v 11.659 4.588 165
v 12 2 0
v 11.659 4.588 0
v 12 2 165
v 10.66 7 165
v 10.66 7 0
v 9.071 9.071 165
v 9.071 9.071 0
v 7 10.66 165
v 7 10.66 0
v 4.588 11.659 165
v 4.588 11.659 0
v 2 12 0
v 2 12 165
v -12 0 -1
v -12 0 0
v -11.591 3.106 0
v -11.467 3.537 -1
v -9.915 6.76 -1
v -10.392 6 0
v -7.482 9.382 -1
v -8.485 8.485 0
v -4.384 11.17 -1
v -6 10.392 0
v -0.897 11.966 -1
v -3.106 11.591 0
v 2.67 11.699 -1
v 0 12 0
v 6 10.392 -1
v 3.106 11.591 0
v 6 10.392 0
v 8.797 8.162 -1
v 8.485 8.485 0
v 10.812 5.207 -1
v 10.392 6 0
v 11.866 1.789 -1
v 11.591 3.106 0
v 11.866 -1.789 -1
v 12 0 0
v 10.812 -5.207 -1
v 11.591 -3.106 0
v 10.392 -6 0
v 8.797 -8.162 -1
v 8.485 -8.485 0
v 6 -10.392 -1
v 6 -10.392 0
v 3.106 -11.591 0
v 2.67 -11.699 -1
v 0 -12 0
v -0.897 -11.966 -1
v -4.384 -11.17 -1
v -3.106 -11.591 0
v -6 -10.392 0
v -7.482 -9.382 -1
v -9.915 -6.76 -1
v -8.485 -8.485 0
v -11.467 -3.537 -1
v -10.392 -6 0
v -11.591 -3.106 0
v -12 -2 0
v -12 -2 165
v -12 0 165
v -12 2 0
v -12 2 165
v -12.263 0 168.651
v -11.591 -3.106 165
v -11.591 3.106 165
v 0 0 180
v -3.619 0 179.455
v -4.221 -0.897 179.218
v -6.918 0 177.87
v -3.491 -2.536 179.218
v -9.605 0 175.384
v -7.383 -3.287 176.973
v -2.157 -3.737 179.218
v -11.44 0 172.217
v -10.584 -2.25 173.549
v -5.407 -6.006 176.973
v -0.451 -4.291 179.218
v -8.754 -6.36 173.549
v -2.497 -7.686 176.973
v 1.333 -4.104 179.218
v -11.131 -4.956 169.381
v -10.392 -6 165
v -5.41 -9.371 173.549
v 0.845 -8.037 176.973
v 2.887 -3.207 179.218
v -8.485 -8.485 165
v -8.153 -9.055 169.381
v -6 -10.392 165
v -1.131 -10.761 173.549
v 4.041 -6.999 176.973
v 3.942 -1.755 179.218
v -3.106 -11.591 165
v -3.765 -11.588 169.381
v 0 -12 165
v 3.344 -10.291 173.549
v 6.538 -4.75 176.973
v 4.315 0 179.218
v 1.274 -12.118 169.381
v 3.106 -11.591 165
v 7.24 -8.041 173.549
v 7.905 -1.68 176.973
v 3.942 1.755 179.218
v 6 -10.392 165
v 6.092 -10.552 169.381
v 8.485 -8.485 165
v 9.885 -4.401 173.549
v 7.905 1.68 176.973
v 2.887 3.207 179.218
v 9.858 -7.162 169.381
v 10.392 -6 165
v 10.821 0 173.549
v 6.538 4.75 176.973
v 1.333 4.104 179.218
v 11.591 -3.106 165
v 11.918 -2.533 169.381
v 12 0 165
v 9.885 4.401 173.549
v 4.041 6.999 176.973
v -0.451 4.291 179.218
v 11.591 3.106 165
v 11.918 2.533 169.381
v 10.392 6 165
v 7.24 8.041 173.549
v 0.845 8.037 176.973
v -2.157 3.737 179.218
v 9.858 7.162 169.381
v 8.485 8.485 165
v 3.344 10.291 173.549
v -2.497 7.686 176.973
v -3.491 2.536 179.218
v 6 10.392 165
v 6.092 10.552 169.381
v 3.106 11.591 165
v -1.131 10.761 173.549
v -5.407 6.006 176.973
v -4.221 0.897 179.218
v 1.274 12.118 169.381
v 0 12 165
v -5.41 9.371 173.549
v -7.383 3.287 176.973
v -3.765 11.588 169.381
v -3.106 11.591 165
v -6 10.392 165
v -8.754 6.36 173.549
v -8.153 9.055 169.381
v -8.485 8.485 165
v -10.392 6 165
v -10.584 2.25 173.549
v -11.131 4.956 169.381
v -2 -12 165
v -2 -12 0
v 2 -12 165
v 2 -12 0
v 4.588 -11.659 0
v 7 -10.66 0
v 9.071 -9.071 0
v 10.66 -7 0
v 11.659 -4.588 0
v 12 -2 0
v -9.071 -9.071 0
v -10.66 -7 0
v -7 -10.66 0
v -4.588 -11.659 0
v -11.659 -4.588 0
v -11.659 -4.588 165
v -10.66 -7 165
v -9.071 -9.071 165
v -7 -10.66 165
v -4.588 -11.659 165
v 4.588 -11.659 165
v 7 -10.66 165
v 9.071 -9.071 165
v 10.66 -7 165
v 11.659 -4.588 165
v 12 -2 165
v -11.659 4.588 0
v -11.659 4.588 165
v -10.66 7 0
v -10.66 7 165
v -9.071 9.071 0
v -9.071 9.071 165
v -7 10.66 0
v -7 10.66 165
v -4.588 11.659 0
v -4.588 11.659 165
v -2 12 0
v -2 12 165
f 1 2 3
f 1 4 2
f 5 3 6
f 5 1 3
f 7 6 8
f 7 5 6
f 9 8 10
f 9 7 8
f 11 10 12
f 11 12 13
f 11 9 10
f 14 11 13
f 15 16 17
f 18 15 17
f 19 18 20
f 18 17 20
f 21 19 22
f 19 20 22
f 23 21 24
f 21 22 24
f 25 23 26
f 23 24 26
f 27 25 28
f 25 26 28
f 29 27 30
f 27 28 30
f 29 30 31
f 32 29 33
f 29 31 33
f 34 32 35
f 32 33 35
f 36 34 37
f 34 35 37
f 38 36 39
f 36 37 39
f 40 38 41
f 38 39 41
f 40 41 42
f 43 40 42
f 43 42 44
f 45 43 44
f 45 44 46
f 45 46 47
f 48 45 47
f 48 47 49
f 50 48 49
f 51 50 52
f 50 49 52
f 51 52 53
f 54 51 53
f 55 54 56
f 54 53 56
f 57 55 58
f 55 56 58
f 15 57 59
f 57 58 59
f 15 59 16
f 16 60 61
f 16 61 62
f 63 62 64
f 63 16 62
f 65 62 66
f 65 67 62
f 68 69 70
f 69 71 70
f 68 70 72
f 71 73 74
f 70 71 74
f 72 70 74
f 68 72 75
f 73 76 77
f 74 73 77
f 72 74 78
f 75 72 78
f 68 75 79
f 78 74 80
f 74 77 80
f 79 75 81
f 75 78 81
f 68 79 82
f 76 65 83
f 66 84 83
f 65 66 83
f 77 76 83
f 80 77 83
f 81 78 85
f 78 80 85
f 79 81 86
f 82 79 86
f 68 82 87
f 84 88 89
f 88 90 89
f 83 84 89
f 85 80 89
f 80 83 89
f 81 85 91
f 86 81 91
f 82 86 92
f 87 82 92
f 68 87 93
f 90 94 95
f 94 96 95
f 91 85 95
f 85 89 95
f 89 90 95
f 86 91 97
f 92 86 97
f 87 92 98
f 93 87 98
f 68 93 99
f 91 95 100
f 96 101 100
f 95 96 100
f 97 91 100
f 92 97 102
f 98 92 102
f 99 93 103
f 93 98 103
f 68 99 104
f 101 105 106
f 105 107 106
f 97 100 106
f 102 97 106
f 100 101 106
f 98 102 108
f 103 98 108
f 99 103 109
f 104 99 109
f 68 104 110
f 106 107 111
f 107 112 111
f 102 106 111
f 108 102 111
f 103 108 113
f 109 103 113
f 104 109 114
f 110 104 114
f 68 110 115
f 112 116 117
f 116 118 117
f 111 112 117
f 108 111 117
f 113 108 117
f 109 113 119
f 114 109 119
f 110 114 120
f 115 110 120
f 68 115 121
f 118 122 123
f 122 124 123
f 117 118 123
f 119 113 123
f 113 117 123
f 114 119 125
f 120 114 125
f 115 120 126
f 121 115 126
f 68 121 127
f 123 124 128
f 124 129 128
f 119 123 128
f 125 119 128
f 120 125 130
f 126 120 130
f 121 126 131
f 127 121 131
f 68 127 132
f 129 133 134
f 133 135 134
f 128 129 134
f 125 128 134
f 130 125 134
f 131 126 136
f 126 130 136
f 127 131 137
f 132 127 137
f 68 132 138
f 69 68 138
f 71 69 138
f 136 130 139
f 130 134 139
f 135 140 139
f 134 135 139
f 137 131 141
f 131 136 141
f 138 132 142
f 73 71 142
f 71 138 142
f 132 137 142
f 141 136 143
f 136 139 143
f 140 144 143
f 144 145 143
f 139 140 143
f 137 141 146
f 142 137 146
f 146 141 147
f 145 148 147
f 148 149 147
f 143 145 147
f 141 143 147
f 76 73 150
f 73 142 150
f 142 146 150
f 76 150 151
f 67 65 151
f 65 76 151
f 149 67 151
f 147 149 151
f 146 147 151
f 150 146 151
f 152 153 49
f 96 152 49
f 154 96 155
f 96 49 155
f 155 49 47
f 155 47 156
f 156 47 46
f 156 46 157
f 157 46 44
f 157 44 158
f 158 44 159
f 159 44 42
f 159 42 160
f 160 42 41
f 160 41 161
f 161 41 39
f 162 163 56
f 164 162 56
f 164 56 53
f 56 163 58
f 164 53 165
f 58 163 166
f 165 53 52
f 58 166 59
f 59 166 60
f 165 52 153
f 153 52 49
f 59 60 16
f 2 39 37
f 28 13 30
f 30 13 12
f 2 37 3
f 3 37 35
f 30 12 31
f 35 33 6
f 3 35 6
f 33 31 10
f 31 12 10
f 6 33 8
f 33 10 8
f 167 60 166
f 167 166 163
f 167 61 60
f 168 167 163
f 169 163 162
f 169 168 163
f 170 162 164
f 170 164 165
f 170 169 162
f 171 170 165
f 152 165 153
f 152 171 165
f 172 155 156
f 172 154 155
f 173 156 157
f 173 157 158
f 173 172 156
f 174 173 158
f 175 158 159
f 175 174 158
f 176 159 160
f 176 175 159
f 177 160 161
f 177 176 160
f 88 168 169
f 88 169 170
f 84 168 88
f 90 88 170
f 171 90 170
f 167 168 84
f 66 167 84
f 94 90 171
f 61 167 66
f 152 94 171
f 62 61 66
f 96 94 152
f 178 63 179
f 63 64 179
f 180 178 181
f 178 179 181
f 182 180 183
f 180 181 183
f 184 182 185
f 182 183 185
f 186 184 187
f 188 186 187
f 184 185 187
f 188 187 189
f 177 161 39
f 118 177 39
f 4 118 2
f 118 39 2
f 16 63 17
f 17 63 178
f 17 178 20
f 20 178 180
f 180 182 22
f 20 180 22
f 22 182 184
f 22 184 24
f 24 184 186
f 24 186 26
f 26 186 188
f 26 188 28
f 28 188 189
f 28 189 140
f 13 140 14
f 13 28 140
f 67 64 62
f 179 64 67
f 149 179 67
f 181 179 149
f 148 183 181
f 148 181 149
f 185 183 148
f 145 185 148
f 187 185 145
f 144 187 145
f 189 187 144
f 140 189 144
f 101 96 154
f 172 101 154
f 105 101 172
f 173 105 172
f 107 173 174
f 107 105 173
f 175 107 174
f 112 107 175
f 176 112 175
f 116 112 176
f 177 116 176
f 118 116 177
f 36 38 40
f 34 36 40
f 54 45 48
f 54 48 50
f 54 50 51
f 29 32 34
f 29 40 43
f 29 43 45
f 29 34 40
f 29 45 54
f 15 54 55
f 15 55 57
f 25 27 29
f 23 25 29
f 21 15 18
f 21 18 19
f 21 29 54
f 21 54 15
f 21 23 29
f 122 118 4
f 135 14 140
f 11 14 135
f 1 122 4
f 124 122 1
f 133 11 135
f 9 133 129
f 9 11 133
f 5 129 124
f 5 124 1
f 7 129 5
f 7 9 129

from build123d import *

# Parameters (mm, degrees)
SKETCH1_W           = 24
SKETCH1_H           = 24
BOSS_EXTRUDE1_DEPTH = 165
FILLET1_R           = 10
SKETCH4_R           = 12
BOSS_EXTRUDE2_DEPTH = 1


with BuildPart() as part:
    # Sketch1 → Boss-Extrude1 (new body)
    with BuildSketch(Plane.XY):
        Rectangle(SKETCH1_W, SKETCH1_H)
    extrude(amount=BOSS_EXTRUDE1_DEPTH)

    # Sketch3 → Revolve1 (revolve)
    with BuildSketch(Plane(origin=(0, 0, 0), x_dir=(-1, 0, 0), z_dir=(0, -1, 0))):
        with BuildLine():
            Line((0, -165), (0, -180))
            ThreePointArc((0, -180), (9.604686356, -175.383749085), (12, -165))
            Line((12, -165), (0, -165))
        make_face()
    revolve(axis=Axis((0, 0, 165), (0, 0, 1)))

    # Fillet1
    fillet1_edges = [part.edges().sort_by_distance(p)[0] for p in [
        (12, -12, 82.5),
        (-12, -12, 82.5),
        (-12, 12, 82.5),
        (12, 12, 82.5),
    ]]
    fillet(fillet1_edges, radius=FILLET1_R)

    # Sketch4 → Boss-Extrude2 (add)
    with BuildSketch(Plane(origin=(0, 0, 0), x_dir=(-1, 0, 0), z_dir=(0, 0, -1))):
        Circle(SKETCH4_R)
    extrude(amount=BOSS_EXTRUDE2_DEPTH)


solid = part.part
